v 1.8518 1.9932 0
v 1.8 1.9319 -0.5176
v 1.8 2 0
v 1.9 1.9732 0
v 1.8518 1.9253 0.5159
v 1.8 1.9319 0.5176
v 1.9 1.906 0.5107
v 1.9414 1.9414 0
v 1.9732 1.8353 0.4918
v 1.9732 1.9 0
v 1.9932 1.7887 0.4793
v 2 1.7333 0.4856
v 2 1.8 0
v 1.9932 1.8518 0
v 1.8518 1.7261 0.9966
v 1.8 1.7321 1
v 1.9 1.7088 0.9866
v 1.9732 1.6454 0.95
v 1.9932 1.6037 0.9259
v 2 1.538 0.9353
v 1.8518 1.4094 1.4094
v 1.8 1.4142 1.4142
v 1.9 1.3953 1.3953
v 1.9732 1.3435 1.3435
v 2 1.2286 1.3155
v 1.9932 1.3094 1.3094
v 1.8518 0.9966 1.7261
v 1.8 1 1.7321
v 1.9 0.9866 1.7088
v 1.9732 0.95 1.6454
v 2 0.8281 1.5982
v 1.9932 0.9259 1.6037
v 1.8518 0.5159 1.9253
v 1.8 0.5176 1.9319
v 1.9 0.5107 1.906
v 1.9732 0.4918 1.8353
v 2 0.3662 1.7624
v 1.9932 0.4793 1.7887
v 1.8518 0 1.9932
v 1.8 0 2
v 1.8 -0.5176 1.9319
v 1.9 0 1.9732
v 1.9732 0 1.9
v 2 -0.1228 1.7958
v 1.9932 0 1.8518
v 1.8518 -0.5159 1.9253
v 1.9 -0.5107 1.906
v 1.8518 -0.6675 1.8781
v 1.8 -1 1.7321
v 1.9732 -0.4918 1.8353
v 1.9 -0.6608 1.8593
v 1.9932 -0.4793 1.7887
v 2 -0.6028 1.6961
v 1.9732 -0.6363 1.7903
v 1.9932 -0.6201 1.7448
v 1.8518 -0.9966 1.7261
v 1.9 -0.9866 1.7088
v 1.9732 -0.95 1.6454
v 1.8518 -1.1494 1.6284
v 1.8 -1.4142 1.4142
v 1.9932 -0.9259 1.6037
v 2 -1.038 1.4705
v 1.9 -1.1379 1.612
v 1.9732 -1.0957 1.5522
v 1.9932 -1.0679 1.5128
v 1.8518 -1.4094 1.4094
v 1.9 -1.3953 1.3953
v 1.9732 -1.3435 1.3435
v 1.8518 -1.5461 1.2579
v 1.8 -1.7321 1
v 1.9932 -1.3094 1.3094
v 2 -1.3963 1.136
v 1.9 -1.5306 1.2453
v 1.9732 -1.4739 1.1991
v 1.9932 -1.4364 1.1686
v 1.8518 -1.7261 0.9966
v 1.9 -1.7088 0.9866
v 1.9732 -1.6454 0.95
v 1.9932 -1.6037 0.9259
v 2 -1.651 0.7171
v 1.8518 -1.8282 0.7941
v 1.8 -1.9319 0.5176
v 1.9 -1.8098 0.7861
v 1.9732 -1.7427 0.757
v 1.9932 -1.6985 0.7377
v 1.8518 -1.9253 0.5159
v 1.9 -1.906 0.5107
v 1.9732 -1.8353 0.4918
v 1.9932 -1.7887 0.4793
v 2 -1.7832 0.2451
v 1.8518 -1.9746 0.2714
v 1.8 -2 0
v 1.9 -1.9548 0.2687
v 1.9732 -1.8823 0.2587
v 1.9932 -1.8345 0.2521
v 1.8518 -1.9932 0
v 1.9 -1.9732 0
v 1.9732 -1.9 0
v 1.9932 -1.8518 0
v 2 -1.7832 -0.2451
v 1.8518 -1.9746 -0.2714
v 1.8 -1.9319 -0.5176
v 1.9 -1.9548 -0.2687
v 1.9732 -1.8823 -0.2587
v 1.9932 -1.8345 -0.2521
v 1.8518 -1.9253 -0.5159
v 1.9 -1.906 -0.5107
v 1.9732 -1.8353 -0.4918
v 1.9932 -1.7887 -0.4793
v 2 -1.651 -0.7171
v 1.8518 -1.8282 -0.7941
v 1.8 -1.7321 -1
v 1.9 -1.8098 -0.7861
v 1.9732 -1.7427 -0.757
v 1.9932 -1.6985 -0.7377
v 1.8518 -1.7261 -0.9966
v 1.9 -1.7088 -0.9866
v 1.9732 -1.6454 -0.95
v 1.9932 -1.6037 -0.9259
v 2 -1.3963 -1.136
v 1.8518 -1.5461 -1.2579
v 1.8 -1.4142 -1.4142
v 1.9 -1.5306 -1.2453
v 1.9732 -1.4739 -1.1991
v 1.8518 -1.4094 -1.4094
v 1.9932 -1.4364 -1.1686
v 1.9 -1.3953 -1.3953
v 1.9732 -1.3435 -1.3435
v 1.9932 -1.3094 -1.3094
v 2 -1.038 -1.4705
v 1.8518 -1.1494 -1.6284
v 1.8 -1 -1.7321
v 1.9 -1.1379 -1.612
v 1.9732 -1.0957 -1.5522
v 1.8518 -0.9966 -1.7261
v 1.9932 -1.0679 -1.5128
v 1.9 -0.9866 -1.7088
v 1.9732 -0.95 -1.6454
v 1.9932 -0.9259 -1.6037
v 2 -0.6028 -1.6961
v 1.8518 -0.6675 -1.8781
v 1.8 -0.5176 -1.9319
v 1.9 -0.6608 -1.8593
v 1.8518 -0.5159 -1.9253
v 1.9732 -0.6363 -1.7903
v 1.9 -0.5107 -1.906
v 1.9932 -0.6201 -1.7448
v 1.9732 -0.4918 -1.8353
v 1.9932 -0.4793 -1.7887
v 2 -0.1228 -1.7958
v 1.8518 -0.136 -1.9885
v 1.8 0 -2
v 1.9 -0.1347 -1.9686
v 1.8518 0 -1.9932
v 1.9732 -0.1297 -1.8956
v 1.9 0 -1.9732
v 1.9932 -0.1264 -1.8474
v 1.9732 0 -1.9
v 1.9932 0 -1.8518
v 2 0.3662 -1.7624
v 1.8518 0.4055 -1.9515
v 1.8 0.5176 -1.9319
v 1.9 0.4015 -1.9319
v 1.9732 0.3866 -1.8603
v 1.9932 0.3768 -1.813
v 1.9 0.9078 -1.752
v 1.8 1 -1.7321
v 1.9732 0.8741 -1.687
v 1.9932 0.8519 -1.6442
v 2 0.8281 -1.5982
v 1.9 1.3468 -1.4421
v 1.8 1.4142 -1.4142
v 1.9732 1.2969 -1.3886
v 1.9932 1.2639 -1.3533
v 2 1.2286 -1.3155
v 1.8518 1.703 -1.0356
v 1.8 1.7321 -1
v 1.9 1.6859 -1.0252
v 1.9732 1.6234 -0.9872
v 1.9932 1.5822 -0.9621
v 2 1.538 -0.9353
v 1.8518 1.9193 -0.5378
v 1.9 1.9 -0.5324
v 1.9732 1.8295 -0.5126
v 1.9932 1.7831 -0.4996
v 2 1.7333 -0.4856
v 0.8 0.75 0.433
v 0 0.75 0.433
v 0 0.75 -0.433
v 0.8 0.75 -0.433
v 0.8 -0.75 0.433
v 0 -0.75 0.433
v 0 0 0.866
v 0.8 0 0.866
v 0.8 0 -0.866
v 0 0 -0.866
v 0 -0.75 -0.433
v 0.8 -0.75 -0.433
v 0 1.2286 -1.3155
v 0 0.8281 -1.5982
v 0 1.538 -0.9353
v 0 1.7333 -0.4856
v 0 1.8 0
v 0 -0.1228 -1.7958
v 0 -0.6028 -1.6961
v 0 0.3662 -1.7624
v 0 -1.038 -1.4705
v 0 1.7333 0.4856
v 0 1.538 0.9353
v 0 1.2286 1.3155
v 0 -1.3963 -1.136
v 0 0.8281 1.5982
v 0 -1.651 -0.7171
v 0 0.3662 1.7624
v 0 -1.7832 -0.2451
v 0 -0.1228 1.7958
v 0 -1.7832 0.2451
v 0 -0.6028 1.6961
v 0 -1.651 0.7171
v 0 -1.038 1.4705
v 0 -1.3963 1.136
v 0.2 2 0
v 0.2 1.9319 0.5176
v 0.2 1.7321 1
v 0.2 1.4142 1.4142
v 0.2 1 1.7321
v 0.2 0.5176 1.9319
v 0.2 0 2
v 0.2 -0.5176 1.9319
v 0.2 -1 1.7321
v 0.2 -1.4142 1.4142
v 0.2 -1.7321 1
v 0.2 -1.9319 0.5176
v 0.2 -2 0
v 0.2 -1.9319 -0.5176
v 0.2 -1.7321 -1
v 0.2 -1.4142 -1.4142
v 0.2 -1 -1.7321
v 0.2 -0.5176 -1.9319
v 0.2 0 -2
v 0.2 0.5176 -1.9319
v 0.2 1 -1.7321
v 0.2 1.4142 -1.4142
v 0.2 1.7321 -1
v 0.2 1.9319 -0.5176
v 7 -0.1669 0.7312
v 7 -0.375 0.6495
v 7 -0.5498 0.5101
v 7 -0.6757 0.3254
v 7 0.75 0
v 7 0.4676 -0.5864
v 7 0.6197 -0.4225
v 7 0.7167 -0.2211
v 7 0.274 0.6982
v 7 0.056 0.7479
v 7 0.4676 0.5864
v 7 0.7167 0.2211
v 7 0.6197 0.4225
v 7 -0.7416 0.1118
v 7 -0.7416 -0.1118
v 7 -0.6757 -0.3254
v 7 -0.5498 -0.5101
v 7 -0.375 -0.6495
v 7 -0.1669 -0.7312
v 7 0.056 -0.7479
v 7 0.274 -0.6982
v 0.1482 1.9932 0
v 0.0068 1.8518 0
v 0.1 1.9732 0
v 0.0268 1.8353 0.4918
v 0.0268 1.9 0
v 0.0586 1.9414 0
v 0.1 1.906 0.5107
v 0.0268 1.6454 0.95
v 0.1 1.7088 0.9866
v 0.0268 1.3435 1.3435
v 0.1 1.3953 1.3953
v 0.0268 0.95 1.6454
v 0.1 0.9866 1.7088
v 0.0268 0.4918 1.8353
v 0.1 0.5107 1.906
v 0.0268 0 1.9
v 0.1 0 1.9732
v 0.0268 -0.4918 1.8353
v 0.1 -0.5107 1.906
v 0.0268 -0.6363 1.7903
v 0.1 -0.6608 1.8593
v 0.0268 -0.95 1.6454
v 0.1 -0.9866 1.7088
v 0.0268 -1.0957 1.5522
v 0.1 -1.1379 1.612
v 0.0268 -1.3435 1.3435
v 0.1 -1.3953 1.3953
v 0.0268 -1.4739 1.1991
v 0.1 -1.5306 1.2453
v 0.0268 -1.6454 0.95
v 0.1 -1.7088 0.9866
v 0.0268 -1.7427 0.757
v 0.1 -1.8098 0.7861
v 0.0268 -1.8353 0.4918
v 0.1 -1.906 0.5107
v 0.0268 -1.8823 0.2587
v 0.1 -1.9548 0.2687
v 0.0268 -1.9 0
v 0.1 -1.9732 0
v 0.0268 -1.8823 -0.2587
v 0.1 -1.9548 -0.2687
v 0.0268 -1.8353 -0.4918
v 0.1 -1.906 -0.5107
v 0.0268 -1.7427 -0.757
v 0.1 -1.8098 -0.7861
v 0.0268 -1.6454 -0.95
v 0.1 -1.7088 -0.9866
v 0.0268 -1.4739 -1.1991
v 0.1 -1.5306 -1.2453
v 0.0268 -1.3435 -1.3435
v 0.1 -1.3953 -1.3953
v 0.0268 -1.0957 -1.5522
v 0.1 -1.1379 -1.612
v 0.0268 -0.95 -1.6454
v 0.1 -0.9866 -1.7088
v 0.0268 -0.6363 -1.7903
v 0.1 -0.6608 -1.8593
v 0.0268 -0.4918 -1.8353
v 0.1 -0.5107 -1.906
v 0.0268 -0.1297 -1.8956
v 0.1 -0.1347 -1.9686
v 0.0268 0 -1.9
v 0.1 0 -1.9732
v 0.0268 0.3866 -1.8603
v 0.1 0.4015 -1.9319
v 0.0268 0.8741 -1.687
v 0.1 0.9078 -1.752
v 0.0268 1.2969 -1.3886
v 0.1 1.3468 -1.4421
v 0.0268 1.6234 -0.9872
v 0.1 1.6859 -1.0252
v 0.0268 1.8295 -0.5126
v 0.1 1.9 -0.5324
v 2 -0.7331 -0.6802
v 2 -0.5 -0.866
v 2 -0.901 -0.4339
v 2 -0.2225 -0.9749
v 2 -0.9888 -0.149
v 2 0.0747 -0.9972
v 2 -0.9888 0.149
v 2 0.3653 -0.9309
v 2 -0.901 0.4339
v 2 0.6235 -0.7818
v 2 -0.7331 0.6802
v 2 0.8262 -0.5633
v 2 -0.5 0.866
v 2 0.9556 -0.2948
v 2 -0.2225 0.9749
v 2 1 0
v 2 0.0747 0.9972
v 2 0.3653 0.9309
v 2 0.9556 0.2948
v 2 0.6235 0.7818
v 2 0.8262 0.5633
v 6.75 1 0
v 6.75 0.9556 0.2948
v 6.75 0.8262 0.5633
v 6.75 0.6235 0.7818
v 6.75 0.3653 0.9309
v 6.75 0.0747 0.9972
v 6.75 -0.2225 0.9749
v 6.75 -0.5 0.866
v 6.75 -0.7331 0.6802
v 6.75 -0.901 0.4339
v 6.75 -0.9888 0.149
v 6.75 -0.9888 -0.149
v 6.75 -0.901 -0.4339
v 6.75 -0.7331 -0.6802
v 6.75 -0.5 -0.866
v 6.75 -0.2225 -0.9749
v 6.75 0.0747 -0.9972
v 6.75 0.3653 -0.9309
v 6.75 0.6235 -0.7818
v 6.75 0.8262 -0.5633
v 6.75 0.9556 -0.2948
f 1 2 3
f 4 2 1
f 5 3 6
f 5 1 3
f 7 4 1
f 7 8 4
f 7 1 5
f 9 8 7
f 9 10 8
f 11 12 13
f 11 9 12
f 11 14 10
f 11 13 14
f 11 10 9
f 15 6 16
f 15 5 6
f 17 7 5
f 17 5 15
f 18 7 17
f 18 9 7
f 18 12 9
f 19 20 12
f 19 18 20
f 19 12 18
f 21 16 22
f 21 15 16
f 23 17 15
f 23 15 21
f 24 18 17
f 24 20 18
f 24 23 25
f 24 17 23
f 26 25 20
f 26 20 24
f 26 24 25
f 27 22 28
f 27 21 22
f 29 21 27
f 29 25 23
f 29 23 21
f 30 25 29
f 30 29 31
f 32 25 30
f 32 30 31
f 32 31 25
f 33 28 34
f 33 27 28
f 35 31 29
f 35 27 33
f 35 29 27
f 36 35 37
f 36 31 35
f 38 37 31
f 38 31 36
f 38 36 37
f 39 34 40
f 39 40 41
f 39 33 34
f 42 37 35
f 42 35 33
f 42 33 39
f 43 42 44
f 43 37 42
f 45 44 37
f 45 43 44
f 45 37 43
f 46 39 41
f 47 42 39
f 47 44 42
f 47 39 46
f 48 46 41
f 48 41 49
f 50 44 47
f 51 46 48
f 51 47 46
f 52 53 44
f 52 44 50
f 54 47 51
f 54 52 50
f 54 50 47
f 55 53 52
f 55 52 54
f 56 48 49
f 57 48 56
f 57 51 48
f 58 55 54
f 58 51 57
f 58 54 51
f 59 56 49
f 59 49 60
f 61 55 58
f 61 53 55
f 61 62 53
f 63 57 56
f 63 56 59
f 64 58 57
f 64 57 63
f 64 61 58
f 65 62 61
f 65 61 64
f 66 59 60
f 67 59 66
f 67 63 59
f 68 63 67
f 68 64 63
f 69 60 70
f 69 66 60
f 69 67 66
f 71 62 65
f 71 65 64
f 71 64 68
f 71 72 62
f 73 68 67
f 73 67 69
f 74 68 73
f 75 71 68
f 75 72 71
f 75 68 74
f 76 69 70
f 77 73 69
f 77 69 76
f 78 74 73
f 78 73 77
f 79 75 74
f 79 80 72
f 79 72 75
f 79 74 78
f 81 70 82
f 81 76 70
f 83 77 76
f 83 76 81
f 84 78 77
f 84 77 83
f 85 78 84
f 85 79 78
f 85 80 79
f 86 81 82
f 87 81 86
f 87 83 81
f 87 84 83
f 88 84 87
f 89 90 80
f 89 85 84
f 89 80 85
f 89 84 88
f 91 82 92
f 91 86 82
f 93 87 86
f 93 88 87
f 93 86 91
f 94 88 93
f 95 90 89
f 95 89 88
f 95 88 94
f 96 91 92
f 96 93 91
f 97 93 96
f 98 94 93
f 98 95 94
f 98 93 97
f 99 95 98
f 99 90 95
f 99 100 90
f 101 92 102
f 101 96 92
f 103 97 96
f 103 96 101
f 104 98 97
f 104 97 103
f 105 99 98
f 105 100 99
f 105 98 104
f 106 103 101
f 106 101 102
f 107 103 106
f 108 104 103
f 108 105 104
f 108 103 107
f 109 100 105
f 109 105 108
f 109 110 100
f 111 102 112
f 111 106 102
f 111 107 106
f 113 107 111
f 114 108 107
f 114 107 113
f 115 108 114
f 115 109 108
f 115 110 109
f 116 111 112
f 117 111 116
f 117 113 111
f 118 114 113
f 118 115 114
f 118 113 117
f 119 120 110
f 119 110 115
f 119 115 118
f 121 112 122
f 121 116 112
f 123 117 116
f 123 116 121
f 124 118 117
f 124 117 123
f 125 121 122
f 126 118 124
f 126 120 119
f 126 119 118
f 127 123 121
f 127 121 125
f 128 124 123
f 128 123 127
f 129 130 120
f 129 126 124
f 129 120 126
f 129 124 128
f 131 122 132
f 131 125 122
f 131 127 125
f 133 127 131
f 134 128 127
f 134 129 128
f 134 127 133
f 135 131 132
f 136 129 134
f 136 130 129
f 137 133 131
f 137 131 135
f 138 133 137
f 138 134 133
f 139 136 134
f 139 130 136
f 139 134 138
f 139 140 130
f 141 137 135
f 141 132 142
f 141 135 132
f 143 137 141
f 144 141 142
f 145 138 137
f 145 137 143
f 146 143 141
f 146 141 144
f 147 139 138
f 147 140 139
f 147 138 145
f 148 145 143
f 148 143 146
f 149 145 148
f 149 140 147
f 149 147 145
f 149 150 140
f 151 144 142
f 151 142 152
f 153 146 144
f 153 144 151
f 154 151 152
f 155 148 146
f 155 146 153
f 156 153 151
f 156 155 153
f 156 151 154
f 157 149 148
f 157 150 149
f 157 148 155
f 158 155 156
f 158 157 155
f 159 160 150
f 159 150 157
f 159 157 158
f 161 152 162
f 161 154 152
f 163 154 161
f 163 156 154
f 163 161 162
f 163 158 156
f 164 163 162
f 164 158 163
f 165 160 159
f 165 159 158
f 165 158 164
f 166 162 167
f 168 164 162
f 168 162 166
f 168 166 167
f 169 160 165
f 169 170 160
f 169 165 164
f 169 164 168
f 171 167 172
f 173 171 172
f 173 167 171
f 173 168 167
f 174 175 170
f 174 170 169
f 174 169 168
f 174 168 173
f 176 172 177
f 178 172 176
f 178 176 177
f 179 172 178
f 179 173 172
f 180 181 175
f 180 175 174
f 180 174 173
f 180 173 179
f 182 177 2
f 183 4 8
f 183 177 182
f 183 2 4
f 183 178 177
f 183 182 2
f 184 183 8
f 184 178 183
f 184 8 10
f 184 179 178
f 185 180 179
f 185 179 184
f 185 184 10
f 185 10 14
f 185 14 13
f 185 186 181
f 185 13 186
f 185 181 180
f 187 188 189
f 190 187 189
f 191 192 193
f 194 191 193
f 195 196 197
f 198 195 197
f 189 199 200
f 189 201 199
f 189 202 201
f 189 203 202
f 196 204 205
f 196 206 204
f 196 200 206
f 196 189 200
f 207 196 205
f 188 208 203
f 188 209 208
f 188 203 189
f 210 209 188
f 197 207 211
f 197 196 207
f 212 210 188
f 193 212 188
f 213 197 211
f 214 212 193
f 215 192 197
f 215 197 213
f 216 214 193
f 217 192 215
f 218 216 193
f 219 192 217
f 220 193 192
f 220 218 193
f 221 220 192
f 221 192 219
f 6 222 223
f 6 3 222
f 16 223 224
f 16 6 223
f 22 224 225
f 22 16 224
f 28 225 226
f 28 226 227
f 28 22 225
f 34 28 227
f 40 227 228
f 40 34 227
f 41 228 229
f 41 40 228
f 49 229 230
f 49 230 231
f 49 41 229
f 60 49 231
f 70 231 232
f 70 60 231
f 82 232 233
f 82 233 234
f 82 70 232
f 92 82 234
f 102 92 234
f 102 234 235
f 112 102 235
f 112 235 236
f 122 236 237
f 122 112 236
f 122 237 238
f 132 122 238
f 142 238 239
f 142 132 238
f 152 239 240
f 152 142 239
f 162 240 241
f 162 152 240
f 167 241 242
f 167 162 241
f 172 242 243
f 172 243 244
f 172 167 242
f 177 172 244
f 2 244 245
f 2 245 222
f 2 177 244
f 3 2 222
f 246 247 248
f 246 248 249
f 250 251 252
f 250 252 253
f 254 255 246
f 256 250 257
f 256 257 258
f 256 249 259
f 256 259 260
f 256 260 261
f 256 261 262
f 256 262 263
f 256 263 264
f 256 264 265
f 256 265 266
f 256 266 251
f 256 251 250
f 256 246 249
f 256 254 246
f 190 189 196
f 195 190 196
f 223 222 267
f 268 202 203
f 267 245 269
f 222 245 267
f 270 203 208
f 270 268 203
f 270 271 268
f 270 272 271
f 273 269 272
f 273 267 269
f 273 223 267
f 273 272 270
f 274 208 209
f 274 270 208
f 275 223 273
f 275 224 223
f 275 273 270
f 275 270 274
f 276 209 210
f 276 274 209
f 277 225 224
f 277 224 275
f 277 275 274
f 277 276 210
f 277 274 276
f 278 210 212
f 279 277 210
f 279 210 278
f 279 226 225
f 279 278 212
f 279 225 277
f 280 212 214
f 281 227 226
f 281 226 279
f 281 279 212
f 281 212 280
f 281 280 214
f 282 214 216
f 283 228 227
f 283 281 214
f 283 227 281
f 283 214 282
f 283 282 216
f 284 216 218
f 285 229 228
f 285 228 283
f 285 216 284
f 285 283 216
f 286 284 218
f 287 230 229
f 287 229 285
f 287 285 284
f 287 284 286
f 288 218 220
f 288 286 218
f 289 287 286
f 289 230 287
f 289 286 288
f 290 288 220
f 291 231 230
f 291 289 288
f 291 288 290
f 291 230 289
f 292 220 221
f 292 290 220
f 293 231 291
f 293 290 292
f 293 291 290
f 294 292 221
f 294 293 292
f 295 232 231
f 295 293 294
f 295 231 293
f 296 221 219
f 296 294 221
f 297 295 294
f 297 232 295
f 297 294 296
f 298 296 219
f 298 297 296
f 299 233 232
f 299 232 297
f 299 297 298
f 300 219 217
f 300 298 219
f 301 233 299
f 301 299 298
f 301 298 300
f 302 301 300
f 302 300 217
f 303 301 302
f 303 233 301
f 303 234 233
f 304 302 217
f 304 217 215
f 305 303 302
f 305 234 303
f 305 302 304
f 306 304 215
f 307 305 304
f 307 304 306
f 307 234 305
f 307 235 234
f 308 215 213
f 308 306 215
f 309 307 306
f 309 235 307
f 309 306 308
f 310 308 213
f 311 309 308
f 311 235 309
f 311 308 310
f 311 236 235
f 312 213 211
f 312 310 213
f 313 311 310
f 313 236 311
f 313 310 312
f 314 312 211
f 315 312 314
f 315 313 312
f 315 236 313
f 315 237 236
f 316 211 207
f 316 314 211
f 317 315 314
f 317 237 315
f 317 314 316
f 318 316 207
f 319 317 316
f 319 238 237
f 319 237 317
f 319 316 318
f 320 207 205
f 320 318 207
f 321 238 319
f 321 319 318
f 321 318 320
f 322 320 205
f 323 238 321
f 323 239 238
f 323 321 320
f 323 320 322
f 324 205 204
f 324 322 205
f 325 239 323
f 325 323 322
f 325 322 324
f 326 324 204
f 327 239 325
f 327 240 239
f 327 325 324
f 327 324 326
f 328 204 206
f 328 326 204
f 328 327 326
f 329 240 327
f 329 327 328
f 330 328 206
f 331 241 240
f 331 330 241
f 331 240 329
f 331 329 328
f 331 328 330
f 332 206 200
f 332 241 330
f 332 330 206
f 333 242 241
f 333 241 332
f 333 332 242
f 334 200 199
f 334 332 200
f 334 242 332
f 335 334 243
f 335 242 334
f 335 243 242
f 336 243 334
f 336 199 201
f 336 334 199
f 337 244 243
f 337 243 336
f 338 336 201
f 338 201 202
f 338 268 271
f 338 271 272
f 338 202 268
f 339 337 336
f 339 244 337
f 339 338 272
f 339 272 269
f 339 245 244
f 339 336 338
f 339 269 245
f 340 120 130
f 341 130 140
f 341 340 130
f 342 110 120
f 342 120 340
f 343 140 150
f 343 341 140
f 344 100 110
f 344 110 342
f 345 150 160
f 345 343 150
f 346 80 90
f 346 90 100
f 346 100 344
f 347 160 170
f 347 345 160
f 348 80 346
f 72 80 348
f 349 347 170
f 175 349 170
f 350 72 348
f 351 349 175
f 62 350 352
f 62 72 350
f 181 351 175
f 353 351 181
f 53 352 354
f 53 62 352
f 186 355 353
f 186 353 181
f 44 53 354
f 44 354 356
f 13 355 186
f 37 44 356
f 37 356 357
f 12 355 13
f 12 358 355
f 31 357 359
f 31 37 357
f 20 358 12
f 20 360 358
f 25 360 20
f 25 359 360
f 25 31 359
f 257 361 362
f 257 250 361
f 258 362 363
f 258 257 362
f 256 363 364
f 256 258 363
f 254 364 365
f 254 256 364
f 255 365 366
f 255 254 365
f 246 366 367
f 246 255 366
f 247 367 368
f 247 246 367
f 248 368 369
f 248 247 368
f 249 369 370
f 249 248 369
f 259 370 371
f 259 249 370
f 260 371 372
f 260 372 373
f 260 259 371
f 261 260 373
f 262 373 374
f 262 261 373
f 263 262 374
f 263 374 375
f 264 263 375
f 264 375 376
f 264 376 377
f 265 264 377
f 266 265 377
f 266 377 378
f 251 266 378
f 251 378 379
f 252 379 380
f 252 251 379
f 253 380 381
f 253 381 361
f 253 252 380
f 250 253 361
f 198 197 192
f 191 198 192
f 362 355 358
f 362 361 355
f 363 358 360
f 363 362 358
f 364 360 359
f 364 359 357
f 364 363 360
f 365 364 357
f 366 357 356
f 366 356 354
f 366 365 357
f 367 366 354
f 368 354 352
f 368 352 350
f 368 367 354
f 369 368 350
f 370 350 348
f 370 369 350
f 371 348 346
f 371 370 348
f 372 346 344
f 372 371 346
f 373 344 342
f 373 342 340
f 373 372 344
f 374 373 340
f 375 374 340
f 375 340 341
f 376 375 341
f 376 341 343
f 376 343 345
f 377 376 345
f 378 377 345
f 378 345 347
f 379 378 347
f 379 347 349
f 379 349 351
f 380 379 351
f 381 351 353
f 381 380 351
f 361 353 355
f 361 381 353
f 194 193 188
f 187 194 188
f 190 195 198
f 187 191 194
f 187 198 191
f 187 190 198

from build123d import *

# Parameters (mm, degrees)
CUT_EXTRUDE1_DEPTH = 0.8


with BuildPart() as part:
    # Sketch2 → Revolve1 (revolve)
    with BuildSketch(Plane.XY):
        with BuildLine():
            Line((0, 0), (0, 1.8))
            ThreePointArc((0, 1.8), (0.058578644, 1.941421356), (0.2, 2))
            Line((0.2, 2), (1.8, 2))
            ThreePointArc((1.8, 2), (1.941421356, 1.941421356), (2, 1.8))
            Line((2, 1.8), (2, 1))
            Line((2, 1), (6.75, 1))
            Line((6.75, 1), (7, 0.75))
            Line((7, 0.75), (7, 0))
            Line((7, 0), (0, 0))
        make_face()
    revolve(axis=Axis((-2.281841559, 0, 0), (1, 0, 0)))

    # Sketch3 → Cut-Extrude1 (cut)
    with BuildSketch(Plane.ZY):
        Polygon((0.433012702, -0.75), (0.866025404, 0), (0.433012702, 0.75), (-0.433012702, 0.75), (-0.866025404, 0), (-0.433012702, -0.75), align=None)
    extrude(amount=-CUT_EXTRUDE1_DEPTH, mode=Mode.SUBTRACT)


solid = part.part
